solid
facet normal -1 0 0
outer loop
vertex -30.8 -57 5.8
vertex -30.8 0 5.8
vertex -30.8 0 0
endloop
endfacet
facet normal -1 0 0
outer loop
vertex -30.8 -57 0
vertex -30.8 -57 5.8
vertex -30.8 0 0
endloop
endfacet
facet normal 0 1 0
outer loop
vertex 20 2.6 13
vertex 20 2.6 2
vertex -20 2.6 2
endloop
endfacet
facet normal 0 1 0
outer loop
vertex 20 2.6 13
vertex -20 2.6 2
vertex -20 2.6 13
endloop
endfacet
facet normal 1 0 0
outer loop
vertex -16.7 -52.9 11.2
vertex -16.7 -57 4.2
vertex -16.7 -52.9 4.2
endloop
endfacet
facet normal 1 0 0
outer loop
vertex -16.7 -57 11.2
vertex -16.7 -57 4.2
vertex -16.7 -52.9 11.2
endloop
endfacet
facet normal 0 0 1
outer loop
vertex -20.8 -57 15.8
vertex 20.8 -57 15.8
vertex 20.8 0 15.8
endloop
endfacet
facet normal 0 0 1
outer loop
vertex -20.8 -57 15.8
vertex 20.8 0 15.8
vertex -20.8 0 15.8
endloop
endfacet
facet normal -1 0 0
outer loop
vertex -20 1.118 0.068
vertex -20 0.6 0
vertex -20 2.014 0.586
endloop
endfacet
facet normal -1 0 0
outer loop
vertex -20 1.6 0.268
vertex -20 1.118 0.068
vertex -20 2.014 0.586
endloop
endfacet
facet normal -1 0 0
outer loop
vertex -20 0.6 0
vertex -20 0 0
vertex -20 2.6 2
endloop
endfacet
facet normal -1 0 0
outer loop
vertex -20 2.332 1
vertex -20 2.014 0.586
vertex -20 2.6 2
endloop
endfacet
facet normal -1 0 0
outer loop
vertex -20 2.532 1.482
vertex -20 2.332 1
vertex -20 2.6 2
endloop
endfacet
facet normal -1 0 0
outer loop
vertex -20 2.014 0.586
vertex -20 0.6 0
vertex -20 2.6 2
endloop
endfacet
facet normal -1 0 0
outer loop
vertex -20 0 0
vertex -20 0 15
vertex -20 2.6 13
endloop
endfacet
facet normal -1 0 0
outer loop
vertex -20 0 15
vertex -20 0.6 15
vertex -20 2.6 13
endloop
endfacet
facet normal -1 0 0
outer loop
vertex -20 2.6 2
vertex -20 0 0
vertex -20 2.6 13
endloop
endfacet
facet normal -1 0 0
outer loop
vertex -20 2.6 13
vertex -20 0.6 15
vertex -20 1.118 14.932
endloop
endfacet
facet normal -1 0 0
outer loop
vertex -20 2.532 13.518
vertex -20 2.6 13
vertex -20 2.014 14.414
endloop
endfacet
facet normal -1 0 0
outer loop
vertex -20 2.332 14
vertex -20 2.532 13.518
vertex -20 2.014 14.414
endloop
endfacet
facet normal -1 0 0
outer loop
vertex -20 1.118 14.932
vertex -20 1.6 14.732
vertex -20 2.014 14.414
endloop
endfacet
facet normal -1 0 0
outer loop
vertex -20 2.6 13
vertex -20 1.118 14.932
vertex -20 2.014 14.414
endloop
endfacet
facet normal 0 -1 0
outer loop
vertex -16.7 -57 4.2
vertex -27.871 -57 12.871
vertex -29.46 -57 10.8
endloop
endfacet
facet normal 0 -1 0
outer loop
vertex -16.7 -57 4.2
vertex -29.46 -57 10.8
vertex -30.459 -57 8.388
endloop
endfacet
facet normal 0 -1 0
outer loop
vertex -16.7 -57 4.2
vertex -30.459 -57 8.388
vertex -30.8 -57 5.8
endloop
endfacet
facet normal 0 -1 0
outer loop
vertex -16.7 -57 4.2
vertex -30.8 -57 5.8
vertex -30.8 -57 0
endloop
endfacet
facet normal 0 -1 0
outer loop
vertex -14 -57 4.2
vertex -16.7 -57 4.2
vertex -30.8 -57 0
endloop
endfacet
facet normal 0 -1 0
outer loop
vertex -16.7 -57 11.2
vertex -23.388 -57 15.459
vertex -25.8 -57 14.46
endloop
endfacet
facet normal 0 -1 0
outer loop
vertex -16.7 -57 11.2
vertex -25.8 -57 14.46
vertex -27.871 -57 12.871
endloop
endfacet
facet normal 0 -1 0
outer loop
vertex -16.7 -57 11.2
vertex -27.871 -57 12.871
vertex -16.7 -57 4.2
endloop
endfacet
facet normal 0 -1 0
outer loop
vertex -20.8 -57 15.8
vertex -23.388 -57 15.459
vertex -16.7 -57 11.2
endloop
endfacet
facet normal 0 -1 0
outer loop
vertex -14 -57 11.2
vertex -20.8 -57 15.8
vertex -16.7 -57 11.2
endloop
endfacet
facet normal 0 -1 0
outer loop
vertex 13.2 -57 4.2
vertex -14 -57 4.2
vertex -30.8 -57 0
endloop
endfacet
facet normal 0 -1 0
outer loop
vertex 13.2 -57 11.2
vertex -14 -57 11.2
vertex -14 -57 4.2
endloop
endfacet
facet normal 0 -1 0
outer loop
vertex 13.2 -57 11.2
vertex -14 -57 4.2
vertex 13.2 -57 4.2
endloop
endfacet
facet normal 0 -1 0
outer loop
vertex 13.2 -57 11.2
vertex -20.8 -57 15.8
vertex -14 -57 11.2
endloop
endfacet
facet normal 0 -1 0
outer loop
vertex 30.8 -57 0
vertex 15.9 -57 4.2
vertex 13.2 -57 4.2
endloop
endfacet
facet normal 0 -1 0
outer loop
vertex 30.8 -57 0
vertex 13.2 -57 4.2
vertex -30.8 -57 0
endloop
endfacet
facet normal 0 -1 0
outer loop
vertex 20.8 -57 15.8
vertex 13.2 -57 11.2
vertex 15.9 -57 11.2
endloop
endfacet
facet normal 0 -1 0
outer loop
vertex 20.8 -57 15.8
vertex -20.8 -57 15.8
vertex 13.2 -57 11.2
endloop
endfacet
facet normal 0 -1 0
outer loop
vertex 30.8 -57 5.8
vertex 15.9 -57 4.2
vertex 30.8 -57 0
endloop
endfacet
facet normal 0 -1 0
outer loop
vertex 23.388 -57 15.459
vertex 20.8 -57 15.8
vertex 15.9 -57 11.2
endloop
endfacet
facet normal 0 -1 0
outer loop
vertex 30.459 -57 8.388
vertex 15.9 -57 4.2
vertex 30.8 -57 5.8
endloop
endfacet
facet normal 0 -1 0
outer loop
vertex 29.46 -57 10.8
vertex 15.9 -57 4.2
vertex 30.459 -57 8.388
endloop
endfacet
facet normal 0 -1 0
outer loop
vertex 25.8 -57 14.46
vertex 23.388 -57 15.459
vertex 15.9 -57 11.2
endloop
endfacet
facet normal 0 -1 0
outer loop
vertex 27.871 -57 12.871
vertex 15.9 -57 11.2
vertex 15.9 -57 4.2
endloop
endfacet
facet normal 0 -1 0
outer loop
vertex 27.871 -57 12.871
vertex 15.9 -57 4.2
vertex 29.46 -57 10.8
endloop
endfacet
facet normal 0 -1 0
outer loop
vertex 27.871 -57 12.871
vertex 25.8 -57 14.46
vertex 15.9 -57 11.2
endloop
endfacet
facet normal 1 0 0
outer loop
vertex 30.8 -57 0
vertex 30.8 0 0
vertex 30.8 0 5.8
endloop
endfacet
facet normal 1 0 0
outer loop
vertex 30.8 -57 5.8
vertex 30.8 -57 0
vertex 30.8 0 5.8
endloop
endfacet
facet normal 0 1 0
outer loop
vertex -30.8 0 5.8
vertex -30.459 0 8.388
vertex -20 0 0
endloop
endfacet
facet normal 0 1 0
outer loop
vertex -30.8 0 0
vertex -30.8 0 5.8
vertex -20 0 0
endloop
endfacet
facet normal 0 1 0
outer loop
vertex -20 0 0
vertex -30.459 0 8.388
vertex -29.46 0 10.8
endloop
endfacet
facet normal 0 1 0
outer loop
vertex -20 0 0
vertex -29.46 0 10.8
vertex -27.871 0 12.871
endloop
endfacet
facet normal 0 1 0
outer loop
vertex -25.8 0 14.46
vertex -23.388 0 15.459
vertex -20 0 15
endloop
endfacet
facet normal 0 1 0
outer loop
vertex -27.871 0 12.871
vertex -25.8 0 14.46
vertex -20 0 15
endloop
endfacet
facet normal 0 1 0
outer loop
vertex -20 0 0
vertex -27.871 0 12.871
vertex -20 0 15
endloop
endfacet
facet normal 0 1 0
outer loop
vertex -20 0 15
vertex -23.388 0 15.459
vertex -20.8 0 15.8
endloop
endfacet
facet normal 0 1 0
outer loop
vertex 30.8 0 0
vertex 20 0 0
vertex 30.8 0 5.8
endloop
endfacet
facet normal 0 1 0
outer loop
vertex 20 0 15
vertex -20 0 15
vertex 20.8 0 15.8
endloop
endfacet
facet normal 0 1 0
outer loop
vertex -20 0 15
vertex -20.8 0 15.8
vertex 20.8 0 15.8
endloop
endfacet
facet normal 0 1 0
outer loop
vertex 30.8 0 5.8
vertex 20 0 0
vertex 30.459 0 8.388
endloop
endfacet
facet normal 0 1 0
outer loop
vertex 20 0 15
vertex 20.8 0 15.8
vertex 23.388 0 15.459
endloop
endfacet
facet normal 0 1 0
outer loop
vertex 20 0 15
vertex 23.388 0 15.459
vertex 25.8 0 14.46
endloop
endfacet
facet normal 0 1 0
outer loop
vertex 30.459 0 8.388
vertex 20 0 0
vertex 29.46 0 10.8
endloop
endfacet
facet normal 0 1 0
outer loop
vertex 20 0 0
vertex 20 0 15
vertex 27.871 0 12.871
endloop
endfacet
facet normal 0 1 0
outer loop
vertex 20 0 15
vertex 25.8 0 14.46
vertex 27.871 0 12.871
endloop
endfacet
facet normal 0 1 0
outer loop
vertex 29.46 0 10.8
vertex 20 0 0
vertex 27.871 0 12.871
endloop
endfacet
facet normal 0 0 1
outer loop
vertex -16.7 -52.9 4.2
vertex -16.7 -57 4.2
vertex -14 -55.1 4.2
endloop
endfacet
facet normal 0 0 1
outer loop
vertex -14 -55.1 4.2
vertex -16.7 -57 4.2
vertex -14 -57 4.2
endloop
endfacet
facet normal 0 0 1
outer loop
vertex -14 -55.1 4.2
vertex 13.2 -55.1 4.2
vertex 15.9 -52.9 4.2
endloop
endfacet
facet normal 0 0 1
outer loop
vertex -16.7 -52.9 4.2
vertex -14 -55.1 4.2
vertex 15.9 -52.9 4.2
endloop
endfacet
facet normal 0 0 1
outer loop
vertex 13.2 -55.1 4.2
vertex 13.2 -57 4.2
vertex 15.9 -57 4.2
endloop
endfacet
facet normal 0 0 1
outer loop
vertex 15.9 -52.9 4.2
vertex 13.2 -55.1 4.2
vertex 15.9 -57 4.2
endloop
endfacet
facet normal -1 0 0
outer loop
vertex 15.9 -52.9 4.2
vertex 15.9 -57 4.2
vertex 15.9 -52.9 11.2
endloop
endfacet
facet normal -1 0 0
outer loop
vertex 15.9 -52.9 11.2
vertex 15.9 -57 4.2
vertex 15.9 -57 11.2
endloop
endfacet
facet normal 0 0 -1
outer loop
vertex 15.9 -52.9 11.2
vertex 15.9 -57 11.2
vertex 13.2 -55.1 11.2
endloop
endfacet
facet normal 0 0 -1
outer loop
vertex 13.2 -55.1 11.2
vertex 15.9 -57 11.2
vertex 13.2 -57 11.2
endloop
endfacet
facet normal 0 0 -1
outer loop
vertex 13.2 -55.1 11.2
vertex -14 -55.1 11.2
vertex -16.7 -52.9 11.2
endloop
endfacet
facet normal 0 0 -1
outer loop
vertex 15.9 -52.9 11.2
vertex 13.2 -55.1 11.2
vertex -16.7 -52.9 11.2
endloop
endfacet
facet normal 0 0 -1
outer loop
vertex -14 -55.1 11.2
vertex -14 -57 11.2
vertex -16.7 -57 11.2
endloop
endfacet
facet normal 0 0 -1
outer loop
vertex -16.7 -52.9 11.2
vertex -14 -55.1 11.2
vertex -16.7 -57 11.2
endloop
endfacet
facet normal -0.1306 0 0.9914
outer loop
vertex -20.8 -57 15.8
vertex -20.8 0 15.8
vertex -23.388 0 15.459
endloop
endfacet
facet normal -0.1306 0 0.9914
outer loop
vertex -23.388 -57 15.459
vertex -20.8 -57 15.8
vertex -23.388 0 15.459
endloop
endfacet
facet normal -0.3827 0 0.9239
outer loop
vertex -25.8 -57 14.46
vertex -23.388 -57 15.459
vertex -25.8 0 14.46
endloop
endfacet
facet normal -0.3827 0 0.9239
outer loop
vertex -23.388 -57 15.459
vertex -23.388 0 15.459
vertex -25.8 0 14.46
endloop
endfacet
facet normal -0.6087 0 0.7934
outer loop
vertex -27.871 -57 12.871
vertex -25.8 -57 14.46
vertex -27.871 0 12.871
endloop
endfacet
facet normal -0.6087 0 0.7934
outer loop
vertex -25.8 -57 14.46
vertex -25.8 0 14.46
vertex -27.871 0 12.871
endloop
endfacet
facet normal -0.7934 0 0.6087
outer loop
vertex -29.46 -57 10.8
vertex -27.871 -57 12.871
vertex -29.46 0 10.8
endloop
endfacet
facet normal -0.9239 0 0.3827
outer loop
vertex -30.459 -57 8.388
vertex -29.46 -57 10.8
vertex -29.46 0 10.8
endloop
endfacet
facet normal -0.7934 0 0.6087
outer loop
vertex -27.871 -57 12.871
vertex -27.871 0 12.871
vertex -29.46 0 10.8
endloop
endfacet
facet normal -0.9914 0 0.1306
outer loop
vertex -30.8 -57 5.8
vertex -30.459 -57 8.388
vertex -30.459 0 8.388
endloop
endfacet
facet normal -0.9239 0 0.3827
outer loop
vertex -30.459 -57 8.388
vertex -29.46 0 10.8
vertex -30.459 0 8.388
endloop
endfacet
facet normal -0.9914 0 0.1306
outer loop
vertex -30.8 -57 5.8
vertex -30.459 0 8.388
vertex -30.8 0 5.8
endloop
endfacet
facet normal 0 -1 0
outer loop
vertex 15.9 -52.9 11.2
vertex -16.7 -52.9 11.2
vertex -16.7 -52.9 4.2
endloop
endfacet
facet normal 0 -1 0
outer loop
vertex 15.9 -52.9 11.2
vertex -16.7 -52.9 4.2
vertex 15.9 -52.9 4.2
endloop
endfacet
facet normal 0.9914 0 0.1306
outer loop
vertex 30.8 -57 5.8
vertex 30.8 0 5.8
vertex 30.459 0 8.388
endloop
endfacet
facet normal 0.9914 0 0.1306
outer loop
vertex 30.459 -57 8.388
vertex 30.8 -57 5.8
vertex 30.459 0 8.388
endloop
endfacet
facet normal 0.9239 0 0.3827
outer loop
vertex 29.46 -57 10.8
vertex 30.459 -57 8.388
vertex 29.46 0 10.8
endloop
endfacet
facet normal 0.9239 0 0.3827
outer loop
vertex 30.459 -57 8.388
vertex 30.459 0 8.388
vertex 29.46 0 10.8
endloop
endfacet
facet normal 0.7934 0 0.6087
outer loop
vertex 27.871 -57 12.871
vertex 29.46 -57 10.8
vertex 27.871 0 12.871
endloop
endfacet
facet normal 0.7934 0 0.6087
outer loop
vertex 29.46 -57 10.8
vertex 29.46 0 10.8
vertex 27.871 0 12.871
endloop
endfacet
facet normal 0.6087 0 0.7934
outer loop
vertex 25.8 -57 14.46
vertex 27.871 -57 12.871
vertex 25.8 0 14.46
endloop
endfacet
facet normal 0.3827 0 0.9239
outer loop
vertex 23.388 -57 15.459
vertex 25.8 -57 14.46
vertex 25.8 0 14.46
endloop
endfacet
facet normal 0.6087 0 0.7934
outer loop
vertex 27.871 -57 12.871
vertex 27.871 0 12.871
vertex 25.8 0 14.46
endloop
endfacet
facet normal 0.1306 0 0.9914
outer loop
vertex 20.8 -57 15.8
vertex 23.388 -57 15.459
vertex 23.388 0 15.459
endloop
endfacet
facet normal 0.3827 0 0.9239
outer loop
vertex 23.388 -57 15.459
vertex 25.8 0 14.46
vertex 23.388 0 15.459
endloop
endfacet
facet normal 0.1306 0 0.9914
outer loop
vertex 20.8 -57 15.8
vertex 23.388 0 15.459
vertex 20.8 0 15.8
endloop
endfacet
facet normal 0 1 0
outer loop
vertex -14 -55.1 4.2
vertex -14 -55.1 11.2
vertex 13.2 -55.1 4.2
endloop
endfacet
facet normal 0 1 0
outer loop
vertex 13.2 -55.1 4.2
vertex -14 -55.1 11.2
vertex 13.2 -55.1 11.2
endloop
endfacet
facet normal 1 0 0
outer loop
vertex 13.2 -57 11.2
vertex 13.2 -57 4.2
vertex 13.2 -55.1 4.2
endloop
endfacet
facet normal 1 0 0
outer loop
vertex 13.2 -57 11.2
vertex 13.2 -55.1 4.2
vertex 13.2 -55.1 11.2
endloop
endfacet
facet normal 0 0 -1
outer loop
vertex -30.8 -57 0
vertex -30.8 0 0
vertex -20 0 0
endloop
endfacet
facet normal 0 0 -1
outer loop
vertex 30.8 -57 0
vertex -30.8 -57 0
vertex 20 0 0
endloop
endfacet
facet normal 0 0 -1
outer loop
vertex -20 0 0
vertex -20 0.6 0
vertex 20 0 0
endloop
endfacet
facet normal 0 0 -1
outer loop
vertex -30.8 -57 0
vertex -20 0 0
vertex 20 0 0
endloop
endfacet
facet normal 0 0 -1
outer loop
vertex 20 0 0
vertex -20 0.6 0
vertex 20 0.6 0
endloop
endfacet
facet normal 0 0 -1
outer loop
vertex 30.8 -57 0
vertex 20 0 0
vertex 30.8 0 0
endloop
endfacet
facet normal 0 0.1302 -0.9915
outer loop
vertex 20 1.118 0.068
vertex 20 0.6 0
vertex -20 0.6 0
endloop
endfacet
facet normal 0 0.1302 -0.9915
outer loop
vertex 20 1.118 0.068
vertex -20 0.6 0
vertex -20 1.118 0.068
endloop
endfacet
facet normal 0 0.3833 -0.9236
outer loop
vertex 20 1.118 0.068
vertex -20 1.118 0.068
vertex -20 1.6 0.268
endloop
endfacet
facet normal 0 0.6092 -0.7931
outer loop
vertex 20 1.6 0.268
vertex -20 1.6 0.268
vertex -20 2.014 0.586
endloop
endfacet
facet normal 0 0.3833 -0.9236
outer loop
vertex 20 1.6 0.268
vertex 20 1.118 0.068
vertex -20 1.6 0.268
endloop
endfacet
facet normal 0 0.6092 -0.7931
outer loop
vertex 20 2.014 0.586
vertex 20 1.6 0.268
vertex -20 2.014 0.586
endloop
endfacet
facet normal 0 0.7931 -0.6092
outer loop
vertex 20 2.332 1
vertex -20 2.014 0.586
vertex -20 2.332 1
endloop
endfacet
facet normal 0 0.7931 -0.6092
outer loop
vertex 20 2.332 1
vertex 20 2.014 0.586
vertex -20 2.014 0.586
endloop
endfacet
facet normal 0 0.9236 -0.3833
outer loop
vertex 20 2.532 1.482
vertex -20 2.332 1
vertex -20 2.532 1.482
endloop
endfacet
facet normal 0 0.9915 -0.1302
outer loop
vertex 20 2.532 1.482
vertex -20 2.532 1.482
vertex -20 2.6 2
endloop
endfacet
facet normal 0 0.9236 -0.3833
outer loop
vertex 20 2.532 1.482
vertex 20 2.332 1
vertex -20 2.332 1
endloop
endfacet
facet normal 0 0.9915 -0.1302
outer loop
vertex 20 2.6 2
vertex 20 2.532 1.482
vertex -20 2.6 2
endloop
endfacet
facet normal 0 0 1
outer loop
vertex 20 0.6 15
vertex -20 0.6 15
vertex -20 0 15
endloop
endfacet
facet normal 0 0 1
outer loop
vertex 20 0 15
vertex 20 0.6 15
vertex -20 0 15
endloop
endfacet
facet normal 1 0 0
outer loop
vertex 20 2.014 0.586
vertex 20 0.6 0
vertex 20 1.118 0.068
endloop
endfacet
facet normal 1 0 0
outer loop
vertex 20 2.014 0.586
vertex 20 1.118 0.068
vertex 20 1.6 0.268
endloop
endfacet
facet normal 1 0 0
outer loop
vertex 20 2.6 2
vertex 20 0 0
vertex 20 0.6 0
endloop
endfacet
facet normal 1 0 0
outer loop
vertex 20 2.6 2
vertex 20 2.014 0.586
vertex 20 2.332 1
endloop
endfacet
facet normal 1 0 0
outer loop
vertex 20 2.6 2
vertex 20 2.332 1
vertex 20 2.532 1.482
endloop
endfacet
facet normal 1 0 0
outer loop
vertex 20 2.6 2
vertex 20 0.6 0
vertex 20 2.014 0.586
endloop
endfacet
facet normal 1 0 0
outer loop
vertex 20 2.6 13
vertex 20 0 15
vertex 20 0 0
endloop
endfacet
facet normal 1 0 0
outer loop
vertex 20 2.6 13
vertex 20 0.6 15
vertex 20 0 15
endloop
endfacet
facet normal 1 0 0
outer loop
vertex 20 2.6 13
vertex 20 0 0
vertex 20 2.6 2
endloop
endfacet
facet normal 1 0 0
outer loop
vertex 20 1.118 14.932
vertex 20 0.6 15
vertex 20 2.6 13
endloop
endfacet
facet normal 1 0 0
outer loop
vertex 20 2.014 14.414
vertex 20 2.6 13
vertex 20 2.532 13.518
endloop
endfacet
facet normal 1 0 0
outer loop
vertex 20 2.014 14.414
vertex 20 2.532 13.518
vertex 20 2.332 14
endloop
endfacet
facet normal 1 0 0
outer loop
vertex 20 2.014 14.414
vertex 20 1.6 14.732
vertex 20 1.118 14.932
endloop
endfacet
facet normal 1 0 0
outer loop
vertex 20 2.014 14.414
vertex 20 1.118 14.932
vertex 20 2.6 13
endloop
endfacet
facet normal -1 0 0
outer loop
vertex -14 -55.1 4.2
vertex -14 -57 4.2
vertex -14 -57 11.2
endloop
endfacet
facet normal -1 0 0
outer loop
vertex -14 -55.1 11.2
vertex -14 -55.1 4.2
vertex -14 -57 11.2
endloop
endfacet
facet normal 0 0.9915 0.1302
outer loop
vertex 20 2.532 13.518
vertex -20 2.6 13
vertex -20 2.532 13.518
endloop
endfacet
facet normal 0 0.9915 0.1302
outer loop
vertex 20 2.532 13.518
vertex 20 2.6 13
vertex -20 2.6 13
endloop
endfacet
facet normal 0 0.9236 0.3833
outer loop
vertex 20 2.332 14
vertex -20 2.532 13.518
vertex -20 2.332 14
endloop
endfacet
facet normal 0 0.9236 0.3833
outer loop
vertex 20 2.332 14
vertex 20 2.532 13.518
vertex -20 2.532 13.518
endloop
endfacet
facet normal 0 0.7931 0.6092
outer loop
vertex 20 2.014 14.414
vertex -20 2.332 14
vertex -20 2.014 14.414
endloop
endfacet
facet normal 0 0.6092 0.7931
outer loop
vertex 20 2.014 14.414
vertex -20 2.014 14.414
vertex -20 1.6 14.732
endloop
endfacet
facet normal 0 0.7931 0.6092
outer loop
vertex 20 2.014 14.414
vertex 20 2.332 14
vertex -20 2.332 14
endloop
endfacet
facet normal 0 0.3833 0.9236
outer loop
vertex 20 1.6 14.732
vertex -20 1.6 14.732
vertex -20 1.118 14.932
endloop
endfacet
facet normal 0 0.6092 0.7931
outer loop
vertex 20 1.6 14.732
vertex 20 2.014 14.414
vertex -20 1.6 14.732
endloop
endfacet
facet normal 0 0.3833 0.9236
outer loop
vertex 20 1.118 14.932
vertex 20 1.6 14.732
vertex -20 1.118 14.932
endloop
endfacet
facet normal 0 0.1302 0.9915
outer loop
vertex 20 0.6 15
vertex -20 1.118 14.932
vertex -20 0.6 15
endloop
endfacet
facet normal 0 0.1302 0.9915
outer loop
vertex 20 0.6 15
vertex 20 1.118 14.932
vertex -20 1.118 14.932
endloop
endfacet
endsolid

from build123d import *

# Parameters (mm, degrees)
F1_DEPTH = 57
F3_DEPTH = 20
F4_W     = 2.7
F4_H     = 7
F4_W_2   = 27.2
F5_DEPTH = 4.1
F6_DEPTH = 1.9


with BuildPart() as f1:
    # F0 (on Front) → F1 (new body)
    with BuildSketch(Plane.XZ):
        with BuildLine():
            Line((20.8, 15.8), (-20.8, 15.8))
            ThreePointArc((-20.8, 15.8), (-27.871068, 12.871068), (-30.8, 5.8))
            Line((-30.8, 5.8), (-30.8, 0))
            Line((-30.8, 0), (30.8, 0))
            Line((30.8, 0), (30.8, 5.8))
            ThreePointArc((30.8, 5.8), (27.871068, 12.871068), (20.8, 15.8))
        make_face()
    extrude(amount=F1_DEPTH)

    # F2 (on Right) → F3 (join, symmetric)
    with BuildSketch(Plane.YZ):
        with BuildLine():
            Line((0, 15), (0, 0))
            Line((0, 0), (0.6, 0))
            ThreePointArc((0.6, 0), (2.014214, 0.585786), (2.6, 2))
            Line((2.6, 2), (2.6, 13))
            ThreePointArc((2.6, 13), (2.014214, 14.414214), (0.6, 15))
            Line((0.6, 15), (0, 15))
        make_face()
    extrude(amount=F3_DEPTH, both=True)

    # F4 (on face) → F5 (cut)
    with BuildSketch(Plane.XZ.offset(57)):
        with Locations((-15.35, 7.7)):
            Rectangle(F4_W, F4_H)
        with Locations((-0.4, 7.7)):
            Rectangle(F4_W_2, F4_H)
        with Locations((14.55, 7.7)):
            Rectangle(F4_W, F4_H)
    extrude(amount=-F5_DEPTH, mode=Mode.SUBTRACT)

    # F4 (on face) → F6 (join)
    with BuildSketch(Plane.XZ.offset(57)):
        with Locations((-0.4, 7.7)):
            Rectangle(F4_W_2, F4_H)
    extrude(amount=-F6_DEPTH)


solid = f1.part
